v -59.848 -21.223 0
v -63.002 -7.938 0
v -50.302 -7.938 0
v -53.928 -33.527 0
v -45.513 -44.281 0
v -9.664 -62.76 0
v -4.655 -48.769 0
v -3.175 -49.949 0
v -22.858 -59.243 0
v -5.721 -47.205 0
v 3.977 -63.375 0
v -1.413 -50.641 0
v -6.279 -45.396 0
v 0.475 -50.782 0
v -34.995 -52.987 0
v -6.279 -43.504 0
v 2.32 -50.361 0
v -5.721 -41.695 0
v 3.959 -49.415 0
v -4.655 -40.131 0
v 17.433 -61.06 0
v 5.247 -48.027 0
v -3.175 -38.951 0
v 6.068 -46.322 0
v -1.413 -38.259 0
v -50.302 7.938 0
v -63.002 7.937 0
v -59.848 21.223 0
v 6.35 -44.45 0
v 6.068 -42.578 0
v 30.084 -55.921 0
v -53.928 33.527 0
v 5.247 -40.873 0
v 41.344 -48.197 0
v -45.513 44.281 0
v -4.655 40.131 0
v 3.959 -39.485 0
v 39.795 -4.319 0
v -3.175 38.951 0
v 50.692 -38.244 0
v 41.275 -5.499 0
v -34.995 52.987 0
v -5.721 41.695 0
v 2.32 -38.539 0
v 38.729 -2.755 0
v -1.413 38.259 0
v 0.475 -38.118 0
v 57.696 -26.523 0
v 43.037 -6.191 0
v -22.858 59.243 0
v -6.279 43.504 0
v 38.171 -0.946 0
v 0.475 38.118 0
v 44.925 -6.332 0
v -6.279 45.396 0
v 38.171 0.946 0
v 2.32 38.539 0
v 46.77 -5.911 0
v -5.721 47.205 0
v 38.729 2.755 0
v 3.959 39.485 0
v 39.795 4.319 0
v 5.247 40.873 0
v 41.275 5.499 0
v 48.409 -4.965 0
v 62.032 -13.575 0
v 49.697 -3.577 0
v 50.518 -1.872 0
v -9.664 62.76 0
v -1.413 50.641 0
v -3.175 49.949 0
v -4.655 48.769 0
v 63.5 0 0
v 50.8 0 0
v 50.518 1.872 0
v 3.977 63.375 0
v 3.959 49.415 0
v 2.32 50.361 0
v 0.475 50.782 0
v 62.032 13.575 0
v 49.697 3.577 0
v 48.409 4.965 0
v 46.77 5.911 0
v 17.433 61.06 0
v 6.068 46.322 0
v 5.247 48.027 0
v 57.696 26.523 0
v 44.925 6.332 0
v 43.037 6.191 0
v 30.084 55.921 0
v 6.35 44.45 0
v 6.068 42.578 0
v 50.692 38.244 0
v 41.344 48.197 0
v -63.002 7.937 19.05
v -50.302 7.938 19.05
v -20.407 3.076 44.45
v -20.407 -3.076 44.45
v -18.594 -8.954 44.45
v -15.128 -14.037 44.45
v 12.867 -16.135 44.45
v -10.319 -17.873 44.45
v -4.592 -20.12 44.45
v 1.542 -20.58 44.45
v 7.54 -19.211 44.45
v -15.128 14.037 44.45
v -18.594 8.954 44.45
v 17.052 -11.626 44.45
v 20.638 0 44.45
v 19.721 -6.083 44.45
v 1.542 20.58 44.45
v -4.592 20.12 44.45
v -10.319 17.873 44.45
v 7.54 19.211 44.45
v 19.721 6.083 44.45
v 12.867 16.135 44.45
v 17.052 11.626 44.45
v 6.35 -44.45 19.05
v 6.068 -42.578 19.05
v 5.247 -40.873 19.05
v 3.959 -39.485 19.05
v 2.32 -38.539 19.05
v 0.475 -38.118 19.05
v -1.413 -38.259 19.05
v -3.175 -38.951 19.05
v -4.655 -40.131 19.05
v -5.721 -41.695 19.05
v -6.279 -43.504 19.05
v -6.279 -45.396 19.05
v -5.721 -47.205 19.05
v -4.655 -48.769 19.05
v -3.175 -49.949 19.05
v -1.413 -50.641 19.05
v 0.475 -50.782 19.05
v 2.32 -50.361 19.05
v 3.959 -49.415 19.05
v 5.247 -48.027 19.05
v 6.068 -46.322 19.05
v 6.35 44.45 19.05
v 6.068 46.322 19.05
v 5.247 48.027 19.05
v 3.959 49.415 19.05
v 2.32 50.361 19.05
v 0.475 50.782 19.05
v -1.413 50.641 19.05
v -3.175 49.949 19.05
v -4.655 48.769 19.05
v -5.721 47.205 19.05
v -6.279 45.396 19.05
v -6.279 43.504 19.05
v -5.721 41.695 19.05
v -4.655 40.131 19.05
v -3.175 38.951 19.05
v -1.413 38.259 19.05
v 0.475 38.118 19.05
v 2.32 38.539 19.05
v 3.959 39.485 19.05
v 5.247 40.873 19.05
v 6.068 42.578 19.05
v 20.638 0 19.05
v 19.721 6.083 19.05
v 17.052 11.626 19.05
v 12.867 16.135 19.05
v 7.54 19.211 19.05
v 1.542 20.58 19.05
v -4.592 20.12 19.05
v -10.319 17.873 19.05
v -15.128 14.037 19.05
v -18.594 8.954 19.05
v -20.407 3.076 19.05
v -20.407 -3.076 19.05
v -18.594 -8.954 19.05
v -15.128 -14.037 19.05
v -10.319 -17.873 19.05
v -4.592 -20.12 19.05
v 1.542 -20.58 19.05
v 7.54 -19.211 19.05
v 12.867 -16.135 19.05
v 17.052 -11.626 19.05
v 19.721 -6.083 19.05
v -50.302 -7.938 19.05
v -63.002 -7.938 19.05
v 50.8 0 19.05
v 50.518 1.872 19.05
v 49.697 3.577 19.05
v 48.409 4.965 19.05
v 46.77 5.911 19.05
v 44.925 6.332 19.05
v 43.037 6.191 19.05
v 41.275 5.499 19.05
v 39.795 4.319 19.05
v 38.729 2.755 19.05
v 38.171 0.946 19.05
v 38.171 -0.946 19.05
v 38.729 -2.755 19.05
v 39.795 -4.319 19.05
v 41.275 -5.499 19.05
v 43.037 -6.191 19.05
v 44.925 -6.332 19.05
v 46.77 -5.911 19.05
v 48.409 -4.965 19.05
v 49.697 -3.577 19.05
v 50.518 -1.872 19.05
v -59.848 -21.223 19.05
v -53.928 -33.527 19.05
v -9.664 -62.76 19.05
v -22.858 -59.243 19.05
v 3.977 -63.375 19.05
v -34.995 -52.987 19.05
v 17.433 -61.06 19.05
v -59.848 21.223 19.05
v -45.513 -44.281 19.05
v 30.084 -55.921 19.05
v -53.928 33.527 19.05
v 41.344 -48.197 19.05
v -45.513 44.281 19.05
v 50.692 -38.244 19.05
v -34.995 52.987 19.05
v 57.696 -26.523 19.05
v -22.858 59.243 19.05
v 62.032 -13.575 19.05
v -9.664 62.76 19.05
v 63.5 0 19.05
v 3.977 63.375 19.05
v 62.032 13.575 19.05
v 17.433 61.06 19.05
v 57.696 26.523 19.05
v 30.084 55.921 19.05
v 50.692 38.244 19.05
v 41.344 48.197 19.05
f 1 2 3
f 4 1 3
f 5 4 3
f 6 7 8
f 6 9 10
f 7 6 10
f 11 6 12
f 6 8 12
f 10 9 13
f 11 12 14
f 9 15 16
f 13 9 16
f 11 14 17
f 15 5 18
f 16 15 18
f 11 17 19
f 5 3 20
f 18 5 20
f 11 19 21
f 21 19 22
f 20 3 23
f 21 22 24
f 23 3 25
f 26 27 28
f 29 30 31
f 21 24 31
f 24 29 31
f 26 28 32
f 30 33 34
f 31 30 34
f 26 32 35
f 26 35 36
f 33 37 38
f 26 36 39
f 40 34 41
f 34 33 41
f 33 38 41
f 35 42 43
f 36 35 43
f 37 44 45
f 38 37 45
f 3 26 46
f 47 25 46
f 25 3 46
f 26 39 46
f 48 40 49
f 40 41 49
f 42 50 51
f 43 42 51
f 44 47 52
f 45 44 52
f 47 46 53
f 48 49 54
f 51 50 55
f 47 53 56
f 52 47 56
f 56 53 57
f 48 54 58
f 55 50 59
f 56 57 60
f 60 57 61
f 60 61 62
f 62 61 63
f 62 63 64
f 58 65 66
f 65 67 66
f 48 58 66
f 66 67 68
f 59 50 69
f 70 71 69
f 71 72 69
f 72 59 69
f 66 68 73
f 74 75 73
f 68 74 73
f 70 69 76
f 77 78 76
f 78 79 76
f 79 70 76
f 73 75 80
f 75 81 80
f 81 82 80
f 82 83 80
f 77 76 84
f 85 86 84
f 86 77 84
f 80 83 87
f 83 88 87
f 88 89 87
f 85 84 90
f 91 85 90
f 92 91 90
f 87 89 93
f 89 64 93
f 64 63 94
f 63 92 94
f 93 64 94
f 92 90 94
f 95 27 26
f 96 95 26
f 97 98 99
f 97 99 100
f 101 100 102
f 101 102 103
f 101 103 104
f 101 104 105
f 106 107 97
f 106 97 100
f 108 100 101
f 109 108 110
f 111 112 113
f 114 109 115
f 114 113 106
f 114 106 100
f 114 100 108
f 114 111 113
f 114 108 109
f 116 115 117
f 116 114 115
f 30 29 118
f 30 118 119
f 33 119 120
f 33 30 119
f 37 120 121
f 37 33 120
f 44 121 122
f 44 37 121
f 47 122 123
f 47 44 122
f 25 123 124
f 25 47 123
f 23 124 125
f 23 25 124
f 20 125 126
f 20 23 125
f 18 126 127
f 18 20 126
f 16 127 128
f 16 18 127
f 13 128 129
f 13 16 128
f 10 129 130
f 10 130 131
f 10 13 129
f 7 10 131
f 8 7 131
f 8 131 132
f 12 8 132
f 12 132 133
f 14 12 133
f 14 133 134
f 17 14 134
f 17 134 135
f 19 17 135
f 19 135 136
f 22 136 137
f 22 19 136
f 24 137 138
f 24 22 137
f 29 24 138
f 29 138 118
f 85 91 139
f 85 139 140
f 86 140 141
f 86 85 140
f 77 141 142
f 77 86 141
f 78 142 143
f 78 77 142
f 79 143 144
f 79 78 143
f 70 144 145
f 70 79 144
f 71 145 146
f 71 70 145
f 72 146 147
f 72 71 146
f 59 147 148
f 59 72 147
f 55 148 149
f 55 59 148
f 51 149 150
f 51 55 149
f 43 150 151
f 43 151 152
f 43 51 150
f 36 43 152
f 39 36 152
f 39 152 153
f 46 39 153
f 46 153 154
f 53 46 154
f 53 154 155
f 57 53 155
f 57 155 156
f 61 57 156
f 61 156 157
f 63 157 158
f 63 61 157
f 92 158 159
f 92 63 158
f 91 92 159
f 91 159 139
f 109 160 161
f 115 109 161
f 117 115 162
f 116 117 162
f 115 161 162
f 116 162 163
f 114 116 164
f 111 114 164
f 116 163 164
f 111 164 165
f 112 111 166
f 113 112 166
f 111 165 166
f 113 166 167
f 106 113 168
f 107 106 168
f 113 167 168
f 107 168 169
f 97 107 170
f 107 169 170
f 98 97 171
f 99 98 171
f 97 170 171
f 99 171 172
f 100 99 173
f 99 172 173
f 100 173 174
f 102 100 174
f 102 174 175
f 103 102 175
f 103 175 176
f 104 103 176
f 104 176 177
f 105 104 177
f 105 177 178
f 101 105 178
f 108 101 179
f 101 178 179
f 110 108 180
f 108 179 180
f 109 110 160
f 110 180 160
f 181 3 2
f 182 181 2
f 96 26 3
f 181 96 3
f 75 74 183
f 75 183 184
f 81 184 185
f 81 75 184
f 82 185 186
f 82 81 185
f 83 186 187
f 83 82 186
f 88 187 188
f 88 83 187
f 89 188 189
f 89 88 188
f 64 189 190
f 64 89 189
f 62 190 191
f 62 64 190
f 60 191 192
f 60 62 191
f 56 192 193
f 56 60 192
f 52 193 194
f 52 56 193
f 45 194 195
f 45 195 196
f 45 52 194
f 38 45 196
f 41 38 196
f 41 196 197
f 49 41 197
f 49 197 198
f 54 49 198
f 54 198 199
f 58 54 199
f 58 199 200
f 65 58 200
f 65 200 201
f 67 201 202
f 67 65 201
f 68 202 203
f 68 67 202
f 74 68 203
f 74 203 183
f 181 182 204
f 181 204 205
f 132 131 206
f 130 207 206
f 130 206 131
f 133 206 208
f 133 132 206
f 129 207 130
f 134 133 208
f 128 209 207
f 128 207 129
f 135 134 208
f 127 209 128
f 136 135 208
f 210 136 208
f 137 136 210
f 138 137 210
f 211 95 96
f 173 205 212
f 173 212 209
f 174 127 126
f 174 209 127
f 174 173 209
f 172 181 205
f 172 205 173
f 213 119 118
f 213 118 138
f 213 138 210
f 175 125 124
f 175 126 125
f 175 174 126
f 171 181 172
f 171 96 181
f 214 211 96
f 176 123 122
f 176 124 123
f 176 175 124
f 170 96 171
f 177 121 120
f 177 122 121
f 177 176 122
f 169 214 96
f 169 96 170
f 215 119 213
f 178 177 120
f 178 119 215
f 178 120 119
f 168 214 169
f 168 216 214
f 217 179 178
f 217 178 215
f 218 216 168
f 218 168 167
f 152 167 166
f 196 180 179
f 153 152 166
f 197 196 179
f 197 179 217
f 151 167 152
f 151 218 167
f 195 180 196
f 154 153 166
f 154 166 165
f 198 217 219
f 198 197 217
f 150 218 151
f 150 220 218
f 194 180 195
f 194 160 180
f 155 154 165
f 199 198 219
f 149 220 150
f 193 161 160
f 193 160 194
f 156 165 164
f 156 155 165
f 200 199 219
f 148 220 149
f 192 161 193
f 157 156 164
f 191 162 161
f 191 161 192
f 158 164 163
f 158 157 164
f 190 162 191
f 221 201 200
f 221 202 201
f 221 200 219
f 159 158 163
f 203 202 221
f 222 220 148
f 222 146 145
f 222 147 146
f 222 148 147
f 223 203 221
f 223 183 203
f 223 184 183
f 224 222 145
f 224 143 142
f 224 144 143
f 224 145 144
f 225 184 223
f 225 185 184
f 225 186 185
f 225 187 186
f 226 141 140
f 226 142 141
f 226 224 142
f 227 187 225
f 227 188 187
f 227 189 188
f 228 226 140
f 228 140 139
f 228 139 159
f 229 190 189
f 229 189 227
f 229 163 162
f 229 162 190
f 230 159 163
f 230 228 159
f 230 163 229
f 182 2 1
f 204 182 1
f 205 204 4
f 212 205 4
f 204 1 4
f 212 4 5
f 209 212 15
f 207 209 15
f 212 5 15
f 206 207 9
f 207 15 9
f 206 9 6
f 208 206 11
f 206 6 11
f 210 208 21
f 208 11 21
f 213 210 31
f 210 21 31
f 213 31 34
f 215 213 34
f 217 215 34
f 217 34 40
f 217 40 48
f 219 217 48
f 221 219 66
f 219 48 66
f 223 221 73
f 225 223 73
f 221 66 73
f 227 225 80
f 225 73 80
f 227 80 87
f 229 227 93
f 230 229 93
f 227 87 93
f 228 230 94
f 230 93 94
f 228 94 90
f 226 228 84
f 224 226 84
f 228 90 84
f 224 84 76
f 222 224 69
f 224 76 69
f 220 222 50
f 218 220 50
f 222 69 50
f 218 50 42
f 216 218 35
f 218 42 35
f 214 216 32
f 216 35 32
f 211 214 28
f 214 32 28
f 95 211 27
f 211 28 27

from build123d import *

# Parameters (mm, degrees)
F0_R     = 6.35
F1_DEPTH = 19.05
F2_R     = 20.6375
F3_DEPTH = 25.4


with BuildPart() as f1:
    # F0 (on Top) → F1 (new body)
    with BuildSketch(Plane.XY):
        with BuildLine():
            Line((-50.301953, -7.9375), (-63.001953, -7.9375))
            ThreePointArc((-63.001953, -7.9375), (63.5, 0), (-63.001953, 7.9375))
            Line((-63.001953, 7.9375), (-50.301953, 7.9375))
            Line((-50.301953, 7.9375), (-50.301953, -7.9375))
        make_face()
        with Locations((0, -44.45)):
            Circle(F0_R, mode=Mode.SUBTRACT)
        with Locations((0, 44.45)):
            Circle(F0_R, mode=Mode.SUBTRACT)
        with Locations((44.45, 0)):
            Circle(F0_R, mode=Mode.SUBTRACT)
    extrude(amount=F1_DEPTH)

    # F2 (on face) → F3 (join)
    with BuildSketch(Plane.XY.offset(19.05)):
        Circle(F2_R)
    extrude(amount=F3_DEPTH)


solid = f1.part
